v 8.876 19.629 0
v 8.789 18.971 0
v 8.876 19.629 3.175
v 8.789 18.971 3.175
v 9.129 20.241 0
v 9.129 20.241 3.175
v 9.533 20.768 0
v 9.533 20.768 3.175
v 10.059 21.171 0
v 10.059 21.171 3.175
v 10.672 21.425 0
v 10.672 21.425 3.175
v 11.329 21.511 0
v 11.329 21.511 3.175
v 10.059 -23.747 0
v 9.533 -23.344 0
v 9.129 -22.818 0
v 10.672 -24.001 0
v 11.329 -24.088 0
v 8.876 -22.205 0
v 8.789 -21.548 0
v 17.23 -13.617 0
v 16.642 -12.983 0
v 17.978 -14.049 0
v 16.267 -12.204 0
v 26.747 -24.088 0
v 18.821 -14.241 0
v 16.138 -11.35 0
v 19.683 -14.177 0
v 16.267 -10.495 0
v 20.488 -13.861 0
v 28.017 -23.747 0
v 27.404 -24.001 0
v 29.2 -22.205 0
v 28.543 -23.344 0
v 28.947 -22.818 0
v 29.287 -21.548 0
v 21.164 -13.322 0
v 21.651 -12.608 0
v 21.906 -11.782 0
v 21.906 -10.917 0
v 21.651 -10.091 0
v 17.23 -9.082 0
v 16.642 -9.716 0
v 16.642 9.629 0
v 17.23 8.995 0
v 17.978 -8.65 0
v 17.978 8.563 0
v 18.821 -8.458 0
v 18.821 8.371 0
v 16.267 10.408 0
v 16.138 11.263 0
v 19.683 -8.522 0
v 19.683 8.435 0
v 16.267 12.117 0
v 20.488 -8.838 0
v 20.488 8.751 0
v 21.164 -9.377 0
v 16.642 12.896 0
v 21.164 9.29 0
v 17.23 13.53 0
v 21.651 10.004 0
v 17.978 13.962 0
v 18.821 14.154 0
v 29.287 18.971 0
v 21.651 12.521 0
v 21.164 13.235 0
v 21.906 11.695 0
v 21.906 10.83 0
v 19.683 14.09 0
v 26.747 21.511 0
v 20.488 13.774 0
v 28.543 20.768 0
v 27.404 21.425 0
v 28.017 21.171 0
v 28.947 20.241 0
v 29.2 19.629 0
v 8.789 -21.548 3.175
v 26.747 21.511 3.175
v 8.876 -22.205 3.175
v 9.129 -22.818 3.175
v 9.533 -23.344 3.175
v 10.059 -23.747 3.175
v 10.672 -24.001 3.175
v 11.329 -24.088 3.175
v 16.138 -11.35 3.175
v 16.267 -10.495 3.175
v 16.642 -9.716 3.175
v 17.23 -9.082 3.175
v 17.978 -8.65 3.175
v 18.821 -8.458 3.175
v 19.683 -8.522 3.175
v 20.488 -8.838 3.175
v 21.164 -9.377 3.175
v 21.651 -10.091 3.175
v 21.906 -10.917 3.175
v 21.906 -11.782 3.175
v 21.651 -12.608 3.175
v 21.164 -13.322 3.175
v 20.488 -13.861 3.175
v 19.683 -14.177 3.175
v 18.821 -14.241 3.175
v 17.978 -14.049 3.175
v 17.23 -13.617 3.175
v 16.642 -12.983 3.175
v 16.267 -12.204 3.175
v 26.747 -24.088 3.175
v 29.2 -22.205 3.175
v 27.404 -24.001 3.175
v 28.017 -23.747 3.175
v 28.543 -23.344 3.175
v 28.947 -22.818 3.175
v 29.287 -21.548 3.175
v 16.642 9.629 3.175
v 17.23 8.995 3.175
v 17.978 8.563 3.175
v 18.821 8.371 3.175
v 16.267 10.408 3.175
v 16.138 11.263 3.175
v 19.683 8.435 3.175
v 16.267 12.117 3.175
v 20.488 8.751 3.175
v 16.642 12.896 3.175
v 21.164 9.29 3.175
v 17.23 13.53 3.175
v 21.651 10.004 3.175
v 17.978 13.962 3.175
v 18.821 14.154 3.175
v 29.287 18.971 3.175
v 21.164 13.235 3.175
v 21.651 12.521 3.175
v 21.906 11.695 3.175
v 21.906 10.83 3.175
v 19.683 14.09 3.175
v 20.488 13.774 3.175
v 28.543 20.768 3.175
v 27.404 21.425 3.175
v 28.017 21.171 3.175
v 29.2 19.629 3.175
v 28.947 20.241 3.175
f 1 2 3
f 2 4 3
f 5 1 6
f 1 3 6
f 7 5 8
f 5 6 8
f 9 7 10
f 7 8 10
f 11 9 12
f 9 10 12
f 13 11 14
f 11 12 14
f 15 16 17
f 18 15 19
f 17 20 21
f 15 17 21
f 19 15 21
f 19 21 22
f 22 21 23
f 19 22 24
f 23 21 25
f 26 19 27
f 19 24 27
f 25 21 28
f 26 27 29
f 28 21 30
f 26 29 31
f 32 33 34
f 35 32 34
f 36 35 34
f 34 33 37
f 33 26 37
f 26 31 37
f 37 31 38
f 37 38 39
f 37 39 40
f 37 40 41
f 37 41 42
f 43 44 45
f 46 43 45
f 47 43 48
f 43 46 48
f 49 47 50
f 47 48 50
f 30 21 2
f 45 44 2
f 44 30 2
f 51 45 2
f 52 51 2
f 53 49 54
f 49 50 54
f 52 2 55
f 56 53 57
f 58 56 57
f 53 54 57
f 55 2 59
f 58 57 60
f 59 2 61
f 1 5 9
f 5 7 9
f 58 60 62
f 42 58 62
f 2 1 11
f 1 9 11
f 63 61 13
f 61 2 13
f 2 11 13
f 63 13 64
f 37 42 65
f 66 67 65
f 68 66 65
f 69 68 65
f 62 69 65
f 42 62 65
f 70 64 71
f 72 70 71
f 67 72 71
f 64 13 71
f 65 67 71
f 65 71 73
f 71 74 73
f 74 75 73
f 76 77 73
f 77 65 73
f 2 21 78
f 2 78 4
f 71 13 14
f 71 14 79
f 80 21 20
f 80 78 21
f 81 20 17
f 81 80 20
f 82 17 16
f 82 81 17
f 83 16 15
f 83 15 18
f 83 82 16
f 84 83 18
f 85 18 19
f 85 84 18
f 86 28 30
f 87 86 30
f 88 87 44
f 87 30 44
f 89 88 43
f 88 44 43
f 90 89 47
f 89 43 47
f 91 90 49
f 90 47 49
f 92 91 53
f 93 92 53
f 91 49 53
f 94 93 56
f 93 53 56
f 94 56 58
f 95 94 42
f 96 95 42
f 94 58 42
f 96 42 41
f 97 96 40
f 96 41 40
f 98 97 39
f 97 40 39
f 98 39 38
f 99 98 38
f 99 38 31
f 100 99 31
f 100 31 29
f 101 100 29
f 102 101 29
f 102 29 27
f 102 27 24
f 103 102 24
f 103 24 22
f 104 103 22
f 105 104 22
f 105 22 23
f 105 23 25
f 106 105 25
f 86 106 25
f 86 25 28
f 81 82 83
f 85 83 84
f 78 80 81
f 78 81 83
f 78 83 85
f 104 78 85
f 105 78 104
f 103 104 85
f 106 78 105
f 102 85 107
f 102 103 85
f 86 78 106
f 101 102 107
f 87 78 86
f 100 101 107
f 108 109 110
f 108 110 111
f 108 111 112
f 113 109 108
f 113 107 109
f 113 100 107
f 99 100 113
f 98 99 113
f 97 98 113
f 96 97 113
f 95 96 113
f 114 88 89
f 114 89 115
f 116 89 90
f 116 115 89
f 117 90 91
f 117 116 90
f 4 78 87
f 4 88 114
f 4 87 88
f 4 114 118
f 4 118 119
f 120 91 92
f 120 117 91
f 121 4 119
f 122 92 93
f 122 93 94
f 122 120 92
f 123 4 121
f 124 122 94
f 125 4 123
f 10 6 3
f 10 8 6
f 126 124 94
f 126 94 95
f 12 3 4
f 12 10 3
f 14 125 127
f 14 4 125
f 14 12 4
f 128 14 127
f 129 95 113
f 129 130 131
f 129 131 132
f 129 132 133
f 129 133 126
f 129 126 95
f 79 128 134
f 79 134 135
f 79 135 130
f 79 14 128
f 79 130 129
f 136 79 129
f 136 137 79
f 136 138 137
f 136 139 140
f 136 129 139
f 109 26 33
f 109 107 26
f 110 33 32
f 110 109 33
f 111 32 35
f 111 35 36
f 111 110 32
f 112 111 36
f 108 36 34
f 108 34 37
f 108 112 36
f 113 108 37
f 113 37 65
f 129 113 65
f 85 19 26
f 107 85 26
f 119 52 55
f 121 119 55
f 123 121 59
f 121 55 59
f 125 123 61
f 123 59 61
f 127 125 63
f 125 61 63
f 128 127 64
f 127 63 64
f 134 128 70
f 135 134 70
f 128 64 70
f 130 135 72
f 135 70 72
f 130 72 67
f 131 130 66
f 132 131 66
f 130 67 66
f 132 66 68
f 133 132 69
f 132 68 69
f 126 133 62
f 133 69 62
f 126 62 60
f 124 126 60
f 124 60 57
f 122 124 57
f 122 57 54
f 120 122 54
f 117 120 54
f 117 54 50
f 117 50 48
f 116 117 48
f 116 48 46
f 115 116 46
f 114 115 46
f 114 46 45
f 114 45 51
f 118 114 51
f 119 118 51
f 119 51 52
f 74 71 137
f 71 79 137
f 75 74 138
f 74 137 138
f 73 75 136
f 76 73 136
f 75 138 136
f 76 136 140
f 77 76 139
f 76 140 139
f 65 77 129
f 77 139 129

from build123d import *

# Parameters (mm, degrees)
SKETCH1_W            = 20.4978
SKETCH1_H            = 45.599133257
SKETCH1_R            = 0.890894817
SKETCH1_R_2          = 0.963661062
BOSS_EXTRUDE1_DEPTH  = 3.175
M5_CLEARANCE_HOLE3_D = 5.8
FILLET1_R            = 2.54
M5_CLEARANCE_HOLE1_D = 5.8


with BuildPart() as part:
    # Sketch1 → Boss-Extrude1 (new body)
    with BuildSketch(Plane.XY):
        with Locations((19.037900458, -1.288082074)):
            Rectangle(SKETCH1_W, SKETCH1_H)
        with Locations((19.037900458, -11.349548702)):
            Circle(SKETCH1_R, mode=Mode.SUBTRACT)
        with Locations((19.037900458, 11.262584555)):
            Circle(SKETCH1_R_2, mode=Mode.SUBTRACT)
    extrude(amount=BOSS_EXTRUDE1_DEPTH)

    # M5 Clearance Hole3 (through all)
    with Locations(Plane.XY.offset(3.175)):
        with Locations((19.037900458, 11.262584555)):
            Hole(M5_CLEARANCE_HOLE3_D / 2)

    # Fillet1
    fillet1_edges = [part.edges().sort_by_distance(p)[0] for p in [
        (29.286800458, 21.511484555, 1.5875),
        (29.286800458, -24.087648702, 1.5875),
        (8.789000458, -24.087648702, 1.5875),
        (8.789000458, 21.511484555, 1.5875),
    ]]
    fillet(fillet1_edges, radius=FILLET1_R)

    # M5 Clearance Hole1 (through all)
    with Locations(Plane.XY.offset(3.175)):
        with Locations((19.037900458, -11.349548702)):
            Hole(M5_CLEARANCE_HOLE1_D / 2)


solid = part.part
